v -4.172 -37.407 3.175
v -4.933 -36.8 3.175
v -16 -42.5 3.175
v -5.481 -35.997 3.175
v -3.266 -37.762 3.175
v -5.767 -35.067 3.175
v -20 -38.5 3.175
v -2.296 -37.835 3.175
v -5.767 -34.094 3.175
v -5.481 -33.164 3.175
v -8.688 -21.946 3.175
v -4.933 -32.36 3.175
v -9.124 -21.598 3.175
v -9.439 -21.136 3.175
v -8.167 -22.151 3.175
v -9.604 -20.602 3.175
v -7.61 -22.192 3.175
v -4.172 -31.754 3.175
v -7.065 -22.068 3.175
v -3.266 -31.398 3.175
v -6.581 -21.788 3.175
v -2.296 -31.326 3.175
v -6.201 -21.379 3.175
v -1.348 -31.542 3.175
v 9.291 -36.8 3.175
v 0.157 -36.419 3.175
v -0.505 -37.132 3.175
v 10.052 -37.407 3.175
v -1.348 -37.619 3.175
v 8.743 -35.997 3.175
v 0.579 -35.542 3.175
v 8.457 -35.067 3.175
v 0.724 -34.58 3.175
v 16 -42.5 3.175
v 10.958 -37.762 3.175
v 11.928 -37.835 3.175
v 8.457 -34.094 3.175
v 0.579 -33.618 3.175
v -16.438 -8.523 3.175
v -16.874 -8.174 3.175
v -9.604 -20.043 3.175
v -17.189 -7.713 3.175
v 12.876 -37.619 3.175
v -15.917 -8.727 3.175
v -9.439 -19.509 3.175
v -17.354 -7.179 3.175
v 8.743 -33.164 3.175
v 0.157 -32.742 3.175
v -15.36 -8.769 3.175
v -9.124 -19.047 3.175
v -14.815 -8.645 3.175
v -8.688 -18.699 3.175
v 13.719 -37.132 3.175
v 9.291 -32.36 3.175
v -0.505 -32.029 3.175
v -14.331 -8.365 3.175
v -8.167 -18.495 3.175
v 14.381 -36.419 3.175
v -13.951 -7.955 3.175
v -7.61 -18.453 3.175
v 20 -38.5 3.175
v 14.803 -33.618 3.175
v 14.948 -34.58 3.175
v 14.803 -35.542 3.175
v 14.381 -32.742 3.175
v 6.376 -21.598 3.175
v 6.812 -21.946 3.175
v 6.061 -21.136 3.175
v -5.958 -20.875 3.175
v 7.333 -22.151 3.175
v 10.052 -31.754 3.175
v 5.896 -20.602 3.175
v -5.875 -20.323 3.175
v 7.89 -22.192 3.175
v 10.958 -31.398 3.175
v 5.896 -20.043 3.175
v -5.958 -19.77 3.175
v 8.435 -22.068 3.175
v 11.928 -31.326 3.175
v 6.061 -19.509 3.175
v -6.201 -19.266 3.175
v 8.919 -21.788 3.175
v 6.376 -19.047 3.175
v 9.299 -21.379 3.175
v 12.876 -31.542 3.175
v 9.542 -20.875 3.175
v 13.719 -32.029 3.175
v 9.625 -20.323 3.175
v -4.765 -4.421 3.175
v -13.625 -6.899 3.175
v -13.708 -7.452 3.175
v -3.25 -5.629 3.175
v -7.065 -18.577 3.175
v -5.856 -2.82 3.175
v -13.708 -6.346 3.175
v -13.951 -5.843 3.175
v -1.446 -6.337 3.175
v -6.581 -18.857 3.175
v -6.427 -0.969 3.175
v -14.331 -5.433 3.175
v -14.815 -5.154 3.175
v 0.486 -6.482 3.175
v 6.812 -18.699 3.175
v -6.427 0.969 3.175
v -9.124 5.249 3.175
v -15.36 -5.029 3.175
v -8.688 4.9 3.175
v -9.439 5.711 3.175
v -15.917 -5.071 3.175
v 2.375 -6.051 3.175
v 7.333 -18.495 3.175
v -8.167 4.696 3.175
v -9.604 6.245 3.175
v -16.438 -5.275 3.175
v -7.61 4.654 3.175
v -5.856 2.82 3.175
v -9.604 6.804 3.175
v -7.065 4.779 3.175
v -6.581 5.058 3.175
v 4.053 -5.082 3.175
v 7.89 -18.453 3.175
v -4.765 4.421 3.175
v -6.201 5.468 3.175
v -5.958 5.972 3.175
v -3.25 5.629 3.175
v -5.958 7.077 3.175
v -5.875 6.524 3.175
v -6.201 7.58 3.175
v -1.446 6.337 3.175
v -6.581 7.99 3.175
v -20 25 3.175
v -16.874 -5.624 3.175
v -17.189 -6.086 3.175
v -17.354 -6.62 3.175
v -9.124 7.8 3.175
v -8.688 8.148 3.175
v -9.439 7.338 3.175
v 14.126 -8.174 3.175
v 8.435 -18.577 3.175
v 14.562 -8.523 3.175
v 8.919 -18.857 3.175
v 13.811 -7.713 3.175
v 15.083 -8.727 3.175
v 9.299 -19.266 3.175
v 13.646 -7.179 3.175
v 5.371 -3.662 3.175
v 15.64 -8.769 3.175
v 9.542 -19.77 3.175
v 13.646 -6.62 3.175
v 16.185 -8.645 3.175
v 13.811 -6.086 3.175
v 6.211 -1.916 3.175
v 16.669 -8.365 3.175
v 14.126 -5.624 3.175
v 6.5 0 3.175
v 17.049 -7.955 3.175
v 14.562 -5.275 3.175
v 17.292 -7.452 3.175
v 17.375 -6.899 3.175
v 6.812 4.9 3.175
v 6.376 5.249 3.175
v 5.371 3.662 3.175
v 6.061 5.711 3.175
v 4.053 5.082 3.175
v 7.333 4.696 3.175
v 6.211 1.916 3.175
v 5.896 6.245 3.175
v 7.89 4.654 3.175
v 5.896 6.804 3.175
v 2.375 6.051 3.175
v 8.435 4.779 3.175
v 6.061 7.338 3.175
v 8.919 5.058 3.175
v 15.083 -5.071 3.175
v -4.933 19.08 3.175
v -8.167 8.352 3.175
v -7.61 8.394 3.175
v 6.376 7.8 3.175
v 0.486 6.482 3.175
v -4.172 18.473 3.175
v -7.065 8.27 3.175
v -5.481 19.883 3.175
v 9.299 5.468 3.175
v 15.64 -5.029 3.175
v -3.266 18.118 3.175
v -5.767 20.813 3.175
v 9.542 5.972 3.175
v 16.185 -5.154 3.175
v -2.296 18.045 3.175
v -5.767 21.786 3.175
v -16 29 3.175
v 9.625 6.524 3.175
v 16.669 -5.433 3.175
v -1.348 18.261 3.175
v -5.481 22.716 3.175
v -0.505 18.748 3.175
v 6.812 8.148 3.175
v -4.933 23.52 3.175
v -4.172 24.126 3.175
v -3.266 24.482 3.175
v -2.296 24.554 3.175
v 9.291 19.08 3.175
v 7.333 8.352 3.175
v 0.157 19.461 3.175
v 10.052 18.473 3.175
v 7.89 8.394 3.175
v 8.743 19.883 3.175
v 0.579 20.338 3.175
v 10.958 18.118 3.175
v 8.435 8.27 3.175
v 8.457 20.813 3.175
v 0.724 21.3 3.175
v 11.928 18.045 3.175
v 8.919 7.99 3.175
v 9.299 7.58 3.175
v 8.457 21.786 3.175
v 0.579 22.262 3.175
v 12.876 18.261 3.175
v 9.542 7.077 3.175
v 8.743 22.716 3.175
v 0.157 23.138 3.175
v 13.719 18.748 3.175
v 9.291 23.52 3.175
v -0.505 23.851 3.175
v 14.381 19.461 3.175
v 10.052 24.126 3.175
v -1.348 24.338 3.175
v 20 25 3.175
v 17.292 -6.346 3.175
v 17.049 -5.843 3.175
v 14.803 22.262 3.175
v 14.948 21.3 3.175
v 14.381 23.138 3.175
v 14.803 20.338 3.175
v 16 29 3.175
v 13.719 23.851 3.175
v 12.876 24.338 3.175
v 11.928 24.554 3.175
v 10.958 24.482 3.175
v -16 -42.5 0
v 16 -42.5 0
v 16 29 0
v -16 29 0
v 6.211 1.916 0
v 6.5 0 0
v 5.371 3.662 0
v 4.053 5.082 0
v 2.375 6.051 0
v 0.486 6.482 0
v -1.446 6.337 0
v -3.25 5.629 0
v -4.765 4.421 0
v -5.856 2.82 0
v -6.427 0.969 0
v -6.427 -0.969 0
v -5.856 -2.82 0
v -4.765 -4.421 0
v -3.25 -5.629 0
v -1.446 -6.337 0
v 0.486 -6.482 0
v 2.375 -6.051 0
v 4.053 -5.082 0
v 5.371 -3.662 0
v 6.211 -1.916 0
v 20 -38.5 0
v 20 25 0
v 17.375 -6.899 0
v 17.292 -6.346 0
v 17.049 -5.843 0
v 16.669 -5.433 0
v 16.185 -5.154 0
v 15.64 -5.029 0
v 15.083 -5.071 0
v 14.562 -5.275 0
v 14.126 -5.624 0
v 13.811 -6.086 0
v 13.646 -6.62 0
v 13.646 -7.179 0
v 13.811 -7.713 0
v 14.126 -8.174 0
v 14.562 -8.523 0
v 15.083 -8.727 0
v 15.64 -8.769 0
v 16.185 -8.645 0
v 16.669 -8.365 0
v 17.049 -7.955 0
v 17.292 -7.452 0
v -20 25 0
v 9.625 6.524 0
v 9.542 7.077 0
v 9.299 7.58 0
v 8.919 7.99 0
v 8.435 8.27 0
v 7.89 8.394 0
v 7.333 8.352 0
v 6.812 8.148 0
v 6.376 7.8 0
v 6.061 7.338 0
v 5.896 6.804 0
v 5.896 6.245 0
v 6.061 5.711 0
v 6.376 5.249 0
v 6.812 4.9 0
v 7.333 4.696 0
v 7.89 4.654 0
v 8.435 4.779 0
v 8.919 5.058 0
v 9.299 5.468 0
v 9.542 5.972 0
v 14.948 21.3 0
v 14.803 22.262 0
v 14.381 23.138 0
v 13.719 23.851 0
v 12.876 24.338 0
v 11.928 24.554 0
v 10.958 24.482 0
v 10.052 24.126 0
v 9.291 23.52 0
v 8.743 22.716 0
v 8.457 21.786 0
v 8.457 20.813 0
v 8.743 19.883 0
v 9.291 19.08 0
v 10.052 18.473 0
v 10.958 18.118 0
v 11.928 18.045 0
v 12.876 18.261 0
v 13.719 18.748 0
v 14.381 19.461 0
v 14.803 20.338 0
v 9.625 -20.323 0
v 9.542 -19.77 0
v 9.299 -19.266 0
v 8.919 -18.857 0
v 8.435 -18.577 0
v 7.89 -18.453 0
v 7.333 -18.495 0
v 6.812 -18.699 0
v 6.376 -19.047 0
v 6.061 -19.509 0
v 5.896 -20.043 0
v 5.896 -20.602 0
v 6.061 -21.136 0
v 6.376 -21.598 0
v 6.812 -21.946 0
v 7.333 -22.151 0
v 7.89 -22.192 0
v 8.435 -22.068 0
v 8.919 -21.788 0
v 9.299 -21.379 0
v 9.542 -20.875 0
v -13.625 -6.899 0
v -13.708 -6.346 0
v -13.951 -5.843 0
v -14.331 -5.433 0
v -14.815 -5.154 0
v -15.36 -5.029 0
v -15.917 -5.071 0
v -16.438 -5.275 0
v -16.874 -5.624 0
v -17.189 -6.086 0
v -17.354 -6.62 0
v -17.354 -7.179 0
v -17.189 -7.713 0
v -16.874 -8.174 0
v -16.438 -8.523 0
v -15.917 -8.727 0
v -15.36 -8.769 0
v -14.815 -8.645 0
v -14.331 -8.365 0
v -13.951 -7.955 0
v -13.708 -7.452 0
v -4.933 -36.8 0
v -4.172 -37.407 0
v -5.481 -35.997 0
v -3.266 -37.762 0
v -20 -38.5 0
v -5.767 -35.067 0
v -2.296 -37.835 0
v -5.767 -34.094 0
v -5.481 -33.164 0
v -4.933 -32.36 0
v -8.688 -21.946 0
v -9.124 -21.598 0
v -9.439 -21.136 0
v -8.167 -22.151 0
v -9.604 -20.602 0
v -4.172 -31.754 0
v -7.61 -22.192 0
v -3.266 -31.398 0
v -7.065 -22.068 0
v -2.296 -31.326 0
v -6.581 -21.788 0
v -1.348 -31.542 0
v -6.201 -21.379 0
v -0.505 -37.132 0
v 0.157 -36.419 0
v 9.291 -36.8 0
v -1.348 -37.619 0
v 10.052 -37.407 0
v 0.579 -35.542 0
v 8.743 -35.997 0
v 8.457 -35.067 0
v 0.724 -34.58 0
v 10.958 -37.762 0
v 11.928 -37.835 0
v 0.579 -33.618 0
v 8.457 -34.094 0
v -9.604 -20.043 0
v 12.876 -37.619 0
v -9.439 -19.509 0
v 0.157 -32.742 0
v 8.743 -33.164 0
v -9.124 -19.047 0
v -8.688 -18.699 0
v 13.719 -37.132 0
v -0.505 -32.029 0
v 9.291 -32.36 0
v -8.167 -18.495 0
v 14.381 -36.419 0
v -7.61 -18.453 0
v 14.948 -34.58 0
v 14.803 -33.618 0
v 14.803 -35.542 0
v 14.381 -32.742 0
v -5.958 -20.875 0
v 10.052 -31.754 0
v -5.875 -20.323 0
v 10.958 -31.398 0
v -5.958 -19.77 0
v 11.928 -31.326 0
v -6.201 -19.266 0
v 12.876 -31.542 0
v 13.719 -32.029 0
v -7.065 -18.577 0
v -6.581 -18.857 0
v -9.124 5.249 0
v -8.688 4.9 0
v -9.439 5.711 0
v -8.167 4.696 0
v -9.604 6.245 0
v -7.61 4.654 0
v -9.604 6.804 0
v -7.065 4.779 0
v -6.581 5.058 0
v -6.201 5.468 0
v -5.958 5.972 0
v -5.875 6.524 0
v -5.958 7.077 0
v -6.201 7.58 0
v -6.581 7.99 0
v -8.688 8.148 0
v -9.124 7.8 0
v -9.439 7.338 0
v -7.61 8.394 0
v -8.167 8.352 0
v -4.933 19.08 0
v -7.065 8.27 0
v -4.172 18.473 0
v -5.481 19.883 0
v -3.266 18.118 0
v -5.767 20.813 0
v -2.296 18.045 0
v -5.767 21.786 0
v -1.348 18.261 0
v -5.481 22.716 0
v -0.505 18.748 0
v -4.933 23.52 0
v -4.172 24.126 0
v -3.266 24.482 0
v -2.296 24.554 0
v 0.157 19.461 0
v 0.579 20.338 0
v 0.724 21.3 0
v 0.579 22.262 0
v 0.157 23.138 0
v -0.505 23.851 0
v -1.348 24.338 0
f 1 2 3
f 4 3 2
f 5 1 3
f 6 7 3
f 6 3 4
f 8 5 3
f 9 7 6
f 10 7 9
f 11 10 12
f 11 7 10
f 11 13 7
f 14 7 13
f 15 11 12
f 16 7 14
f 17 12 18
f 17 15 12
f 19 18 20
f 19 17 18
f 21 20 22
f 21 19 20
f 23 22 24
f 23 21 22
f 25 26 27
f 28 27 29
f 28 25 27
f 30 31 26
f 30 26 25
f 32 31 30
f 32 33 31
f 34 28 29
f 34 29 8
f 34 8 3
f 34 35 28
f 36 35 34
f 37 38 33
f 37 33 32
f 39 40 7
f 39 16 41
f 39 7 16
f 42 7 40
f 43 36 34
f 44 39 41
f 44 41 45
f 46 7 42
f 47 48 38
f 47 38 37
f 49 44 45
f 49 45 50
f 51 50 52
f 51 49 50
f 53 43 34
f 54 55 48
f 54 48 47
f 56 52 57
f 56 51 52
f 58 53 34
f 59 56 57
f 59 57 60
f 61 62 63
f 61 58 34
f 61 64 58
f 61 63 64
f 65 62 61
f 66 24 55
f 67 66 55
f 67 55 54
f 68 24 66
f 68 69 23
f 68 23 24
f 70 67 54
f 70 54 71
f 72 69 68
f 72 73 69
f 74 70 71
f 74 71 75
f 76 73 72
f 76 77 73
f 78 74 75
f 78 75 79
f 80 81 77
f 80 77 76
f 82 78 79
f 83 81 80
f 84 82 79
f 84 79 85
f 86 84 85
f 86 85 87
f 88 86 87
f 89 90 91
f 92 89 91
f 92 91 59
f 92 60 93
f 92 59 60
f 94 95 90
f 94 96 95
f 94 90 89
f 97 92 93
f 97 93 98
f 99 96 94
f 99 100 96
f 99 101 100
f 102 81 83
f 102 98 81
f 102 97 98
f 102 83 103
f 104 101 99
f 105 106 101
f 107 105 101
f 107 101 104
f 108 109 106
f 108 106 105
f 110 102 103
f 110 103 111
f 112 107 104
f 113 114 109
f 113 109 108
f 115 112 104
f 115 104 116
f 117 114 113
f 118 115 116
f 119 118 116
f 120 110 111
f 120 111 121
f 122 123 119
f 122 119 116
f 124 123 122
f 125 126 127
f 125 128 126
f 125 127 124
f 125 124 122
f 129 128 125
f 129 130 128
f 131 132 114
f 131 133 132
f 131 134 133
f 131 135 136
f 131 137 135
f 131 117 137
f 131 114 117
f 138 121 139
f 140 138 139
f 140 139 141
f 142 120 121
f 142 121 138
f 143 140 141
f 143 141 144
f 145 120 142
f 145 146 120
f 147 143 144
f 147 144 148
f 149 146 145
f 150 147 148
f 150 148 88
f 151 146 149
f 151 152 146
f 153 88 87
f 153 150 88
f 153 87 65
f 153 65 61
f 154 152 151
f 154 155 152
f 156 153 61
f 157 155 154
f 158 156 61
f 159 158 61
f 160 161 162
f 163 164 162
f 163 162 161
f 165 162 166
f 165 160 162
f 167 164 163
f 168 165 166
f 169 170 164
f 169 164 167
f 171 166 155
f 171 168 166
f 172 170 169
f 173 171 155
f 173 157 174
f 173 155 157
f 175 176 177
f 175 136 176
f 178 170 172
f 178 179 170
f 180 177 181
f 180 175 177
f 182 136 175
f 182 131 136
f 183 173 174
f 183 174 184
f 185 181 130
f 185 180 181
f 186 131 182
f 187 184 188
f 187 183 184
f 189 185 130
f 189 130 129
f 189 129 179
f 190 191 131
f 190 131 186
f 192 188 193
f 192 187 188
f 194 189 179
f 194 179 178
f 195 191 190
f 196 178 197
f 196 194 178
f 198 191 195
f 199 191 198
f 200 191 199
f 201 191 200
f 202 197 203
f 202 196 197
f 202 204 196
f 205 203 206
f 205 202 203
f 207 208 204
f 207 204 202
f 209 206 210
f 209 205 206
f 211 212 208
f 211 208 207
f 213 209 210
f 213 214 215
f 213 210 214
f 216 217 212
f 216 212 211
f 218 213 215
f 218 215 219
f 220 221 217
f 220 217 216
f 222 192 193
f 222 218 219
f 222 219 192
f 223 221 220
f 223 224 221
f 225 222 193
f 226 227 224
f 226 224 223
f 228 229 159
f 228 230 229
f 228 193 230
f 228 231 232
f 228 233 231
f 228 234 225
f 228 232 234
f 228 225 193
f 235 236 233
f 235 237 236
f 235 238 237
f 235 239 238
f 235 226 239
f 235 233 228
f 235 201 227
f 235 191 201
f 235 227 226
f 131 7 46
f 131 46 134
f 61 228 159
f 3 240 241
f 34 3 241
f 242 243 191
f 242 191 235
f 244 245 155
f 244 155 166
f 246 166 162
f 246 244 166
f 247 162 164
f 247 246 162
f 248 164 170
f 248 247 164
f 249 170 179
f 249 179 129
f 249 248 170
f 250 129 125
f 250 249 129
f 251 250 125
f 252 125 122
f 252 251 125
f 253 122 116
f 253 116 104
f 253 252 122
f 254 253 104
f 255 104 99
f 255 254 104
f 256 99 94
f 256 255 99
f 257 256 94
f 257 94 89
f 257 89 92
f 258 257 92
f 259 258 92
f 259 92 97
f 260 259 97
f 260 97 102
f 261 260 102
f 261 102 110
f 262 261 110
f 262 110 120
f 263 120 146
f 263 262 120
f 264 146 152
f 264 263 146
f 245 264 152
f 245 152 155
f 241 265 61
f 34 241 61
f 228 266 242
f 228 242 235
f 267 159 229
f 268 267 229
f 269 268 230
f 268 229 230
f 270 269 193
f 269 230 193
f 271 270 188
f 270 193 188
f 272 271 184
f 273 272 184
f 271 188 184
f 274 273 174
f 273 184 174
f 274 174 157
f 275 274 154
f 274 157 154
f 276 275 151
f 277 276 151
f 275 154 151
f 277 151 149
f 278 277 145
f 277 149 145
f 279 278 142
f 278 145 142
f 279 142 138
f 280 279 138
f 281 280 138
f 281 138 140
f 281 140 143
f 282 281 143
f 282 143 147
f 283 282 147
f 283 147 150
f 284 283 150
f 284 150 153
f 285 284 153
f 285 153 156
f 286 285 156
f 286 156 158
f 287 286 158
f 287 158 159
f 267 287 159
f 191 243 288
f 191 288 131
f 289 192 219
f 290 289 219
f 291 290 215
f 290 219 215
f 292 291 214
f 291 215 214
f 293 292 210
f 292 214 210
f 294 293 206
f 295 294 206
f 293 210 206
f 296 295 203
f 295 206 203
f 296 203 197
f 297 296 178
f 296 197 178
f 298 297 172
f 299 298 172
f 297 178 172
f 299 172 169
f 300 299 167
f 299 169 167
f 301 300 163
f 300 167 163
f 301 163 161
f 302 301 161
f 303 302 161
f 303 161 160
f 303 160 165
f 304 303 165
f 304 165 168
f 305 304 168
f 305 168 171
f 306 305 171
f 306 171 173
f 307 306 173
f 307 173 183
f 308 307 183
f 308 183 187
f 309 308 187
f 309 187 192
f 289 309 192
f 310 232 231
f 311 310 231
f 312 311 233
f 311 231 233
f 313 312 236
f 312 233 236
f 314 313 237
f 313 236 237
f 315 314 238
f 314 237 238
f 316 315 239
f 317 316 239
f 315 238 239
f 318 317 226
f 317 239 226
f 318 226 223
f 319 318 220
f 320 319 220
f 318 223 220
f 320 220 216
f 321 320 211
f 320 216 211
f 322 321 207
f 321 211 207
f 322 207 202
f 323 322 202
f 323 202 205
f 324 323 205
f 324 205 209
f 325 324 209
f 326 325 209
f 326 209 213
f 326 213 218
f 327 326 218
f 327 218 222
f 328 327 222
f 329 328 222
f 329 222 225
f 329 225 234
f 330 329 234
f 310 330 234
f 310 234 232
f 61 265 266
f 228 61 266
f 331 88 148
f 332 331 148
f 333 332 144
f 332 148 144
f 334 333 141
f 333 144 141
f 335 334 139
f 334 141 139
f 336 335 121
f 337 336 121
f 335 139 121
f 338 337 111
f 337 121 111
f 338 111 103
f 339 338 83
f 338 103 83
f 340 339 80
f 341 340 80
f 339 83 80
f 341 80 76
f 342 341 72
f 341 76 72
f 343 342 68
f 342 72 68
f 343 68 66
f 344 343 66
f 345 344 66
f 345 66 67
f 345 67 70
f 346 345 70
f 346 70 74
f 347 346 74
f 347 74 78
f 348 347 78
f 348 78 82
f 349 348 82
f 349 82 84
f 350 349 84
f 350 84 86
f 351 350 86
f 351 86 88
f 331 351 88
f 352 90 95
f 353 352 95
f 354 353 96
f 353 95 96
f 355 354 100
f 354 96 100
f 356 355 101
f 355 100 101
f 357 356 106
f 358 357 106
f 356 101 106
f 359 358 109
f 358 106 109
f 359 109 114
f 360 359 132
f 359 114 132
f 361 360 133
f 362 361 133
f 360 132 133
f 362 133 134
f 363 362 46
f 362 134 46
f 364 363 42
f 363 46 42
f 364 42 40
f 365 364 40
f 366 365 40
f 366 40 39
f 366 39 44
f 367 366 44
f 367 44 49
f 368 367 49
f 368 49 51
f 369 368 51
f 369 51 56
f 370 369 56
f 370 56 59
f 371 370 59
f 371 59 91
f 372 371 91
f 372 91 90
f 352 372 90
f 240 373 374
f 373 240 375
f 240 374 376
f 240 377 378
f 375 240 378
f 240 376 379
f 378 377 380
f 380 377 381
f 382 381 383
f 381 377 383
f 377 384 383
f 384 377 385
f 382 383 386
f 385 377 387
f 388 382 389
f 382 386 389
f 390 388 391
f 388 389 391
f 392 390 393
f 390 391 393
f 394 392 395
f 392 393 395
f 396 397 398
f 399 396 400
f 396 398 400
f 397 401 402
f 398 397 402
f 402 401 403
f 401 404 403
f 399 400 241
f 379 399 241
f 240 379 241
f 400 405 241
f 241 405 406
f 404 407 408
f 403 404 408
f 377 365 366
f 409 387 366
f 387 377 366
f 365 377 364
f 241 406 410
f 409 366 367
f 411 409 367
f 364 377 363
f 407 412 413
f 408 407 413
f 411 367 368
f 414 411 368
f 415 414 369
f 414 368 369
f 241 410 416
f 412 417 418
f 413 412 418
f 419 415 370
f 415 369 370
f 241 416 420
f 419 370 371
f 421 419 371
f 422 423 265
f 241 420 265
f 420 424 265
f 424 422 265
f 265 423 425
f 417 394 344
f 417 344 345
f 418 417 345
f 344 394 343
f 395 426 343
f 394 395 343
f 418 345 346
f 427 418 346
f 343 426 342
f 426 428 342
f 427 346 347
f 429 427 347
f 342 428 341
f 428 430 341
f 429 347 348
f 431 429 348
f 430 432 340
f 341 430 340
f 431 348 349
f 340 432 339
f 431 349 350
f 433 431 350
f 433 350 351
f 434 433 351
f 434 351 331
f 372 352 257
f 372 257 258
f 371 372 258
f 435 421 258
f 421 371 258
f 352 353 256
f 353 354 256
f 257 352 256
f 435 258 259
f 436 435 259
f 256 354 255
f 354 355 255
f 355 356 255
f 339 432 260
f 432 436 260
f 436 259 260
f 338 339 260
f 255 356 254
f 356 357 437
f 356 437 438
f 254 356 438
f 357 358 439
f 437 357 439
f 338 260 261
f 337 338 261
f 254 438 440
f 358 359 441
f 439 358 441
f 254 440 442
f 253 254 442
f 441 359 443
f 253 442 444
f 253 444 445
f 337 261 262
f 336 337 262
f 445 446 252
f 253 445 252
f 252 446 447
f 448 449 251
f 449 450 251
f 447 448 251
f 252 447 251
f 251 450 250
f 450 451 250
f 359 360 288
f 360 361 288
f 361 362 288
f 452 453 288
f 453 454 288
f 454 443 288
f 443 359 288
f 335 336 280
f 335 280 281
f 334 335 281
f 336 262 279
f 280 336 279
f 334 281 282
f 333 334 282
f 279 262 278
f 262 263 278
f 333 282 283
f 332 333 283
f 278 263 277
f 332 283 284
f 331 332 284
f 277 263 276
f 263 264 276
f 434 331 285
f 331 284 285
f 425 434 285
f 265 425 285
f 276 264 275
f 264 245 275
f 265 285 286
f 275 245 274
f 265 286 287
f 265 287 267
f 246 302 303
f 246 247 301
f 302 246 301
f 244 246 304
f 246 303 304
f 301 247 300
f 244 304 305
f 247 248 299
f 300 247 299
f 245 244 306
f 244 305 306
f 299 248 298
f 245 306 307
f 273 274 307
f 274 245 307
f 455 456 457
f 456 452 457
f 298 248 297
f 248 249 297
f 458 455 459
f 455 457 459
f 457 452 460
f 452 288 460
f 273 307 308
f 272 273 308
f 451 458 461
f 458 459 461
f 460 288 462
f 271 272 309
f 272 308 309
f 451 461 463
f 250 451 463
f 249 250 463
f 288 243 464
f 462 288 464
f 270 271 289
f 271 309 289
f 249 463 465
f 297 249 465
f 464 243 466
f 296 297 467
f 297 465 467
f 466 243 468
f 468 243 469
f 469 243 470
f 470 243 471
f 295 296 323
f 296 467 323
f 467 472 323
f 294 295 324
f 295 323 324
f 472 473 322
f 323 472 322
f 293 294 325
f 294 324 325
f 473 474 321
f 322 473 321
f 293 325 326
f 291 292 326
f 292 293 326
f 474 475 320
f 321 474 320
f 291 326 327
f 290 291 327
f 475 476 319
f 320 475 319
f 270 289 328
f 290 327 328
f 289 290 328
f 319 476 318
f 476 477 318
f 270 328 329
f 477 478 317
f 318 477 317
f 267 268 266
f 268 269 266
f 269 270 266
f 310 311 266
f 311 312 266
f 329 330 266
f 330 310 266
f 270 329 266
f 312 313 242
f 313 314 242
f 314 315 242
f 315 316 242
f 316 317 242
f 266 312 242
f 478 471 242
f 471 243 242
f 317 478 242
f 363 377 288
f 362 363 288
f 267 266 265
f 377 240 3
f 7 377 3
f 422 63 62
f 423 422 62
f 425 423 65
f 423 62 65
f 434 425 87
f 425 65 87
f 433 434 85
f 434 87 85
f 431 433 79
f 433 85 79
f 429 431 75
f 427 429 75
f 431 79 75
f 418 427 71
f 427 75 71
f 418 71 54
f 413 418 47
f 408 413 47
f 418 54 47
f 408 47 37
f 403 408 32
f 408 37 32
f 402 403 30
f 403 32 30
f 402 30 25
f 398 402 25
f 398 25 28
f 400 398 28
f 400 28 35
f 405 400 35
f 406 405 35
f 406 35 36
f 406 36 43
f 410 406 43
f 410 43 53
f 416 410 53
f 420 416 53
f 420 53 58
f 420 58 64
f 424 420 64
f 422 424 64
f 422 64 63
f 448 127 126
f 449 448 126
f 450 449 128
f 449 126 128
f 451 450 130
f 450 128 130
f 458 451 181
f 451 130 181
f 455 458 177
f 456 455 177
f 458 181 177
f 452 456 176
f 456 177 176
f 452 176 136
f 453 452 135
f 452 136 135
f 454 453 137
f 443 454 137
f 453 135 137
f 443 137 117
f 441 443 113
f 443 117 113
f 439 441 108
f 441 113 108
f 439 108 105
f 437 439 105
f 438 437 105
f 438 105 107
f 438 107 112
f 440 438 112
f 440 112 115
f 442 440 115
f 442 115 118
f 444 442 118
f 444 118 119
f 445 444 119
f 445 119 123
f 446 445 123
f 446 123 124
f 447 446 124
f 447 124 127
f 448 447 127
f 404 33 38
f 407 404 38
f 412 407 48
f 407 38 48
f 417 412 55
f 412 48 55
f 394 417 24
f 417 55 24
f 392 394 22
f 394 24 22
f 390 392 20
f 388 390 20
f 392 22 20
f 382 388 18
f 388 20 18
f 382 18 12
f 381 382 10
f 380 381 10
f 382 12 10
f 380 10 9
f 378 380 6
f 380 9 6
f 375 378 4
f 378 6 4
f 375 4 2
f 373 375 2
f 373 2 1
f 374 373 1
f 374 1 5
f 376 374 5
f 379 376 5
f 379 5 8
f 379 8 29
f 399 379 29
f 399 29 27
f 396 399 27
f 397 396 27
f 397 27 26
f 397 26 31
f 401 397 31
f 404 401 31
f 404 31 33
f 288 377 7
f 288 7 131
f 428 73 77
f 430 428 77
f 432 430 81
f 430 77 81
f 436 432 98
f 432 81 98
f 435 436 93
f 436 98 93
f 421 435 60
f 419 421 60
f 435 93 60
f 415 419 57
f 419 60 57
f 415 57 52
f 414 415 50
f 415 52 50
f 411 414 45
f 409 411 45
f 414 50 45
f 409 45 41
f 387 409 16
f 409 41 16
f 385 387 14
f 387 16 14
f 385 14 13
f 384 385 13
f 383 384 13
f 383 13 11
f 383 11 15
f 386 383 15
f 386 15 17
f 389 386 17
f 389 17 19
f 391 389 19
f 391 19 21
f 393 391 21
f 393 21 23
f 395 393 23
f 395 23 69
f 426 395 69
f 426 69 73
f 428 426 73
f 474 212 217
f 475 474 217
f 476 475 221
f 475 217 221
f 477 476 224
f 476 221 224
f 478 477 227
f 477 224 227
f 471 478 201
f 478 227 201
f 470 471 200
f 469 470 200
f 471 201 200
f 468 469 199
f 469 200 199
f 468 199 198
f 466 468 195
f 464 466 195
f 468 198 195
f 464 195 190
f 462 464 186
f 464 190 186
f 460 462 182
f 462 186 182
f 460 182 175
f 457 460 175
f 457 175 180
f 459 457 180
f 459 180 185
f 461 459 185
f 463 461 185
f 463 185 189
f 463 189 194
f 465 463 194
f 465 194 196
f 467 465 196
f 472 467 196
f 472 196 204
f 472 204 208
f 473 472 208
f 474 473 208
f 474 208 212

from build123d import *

# Parameters (mm, degrees)
SKETCH1_W               = 40
SKETCH1_H               = 71.5
SKETCH1_R               = 6.5
BOSS_EXTRUDE1_DEPTH     = 3.175
CHAMFER1_SIZE           = 4
SKETCH2_R               = 1.875
CUT_EXTRUDE1_DEPTH      = 4.175
F_1_4_CLEARANCE_HOLE1_D = 6.5278


with BuildPart() as part:
    # Sketch1 → Boss-Extrude1 (new body)
    with BuildSketch(Plane.XY):
        with Locations((0, -6.75)):
            Rectangle(SKETCH1_W, SKETCH1_H)
        Circle(SKETCH1_R, mode=Mode.SUBTRACT)
    extrude(amount=BOSS_EXTRUDE1_DEPTH)

    # Chamfer1
    chamfer1_edges = [part.edges().sort_by_distance(p)[0] for p in [
        (-20, 29, 1.5875),
        (20, 29, 1.5875),
        (20, -42.5, 1.5875),
        (-20, -42.5, 1.5875),
    ]]
    chamfer(chamfer1_edges, length=CHAMFER1_SIZE)

    # Sketch2 → Cut-Extrude1 (cut, through all)
    with BuildSketch(Plane.XY.offset(3.175)):
        with Locations((-7.75, 6.524250301)):
            Circle(SKETCH2_R)
        with Locations((7.75, 6.524250301)):
            Circle(SKETCH2_R)
        with Locations((15.5, -6.899143458)):
            Circle(SKETCH2_R)
        with Locations((7.75, -20.322537216)):
            Circle(SKETCH2_R)
        with Locations((-7.75, -20.322537216)):
            Circle(SKETCH2_R)
        with Locations((-15.5, -6.899143458)):
            Circle(SKETCH2_R)
    extrude(amount=-CUT_EXTRUDE1_DEPTH, mode=Mode.SUBTRACT)

    # 1/4 Clearance Hole1 (through all)
    with Locations(Plane(origin=(0, 0, 0), x_dir=(-1, 0, 0), z_dir=(0, 0, -1))):
        with Locations((-11.684, 21.299580024), (2.54, 21.299580024), (-11.684, -34.580419976), (2.54, -34.580419976)):
            Hole(F_1_4_CLEARANCE_HOLE1_D / 2)


solid = part.part
